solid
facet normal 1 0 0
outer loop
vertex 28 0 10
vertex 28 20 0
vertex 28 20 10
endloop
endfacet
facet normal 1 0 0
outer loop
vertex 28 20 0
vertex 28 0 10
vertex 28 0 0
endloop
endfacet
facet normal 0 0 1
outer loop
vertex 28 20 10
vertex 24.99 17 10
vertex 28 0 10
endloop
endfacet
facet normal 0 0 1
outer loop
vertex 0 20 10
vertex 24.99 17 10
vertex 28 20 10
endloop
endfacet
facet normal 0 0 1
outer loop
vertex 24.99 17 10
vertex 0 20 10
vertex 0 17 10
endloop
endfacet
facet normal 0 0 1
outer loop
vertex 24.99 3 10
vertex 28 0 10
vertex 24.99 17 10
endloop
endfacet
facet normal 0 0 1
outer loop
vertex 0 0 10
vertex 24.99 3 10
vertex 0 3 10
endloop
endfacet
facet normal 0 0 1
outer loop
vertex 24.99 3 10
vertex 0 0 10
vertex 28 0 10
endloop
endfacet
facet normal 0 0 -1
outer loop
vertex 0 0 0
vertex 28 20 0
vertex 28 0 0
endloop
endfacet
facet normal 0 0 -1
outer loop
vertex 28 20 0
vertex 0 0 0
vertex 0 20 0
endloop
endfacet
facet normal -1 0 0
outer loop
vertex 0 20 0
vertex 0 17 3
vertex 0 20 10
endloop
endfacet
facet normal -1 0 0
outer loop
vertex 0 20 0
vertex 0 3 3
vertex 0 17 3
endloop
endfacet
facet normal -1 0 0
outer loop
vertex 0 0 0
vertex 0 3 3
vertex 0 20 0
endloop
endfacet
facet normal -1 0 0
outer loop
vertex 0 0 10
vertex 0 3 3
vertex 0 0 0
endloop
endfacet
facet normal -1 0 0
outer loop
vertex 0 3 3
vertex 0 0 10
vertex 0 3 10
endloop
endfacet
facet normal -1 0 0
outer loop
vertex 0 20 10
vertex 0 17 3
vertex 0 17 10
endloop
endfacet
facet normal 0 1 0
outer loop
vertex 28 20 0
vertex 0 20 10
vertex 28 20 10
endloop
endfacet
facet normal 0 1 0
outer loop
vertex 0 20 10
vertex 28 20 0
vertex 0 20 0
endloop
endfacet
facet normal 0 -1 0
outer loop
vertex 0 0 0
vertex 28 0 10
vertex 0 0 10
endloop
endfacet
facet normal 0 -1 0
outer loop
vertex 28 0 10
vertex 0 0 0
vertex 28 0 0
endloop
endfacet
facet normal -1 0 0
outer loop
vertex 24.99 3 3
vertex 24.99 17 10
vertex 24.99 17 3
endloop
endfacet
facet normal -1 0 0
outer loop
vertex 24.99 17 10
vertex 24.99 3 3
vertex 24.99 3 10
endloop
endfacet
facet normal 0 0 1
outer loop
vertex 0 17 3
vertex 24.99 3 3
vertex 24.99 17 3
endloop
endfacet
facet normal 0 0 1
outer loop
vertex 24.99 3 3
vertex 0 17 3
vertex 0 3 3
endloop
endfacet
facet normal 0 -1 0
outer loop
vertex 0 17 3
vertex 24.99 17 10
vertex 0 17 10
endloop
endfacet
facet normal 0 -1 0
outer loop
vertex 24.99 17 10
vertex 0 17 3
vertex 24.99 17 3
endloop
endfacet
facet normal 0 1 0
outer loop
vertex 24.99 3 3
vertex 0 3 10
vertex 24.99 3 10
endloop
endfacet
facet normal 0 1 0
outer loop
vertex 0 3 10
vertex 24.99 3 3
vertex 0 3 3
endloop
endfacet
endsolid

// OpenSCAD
// ****************************************************************************
// Your Gimbal - simple Customizable IMU Calibration cube
// Author: Peter Holzwarth
// ****************************************************************************
// https://en.wikibooks.org/wiki/OpenSCAD_User_Manual/The_OpenSCAD_Language

// Width of your IMU
w= 22; // [10:30]

// Depth of your IMU
d= 14; // [10:20]

// Height of your IMU
h= 4; // [3:15]

IMUCalibrationBox(w, d, h);

module IMUCalibrationBox(w, d, h) {
    difference() {
        cube([w+6,d+6,h+6]);
        translate([-0.01,3,3]) cube([w+3,d,h+3.01]);
    }
}
